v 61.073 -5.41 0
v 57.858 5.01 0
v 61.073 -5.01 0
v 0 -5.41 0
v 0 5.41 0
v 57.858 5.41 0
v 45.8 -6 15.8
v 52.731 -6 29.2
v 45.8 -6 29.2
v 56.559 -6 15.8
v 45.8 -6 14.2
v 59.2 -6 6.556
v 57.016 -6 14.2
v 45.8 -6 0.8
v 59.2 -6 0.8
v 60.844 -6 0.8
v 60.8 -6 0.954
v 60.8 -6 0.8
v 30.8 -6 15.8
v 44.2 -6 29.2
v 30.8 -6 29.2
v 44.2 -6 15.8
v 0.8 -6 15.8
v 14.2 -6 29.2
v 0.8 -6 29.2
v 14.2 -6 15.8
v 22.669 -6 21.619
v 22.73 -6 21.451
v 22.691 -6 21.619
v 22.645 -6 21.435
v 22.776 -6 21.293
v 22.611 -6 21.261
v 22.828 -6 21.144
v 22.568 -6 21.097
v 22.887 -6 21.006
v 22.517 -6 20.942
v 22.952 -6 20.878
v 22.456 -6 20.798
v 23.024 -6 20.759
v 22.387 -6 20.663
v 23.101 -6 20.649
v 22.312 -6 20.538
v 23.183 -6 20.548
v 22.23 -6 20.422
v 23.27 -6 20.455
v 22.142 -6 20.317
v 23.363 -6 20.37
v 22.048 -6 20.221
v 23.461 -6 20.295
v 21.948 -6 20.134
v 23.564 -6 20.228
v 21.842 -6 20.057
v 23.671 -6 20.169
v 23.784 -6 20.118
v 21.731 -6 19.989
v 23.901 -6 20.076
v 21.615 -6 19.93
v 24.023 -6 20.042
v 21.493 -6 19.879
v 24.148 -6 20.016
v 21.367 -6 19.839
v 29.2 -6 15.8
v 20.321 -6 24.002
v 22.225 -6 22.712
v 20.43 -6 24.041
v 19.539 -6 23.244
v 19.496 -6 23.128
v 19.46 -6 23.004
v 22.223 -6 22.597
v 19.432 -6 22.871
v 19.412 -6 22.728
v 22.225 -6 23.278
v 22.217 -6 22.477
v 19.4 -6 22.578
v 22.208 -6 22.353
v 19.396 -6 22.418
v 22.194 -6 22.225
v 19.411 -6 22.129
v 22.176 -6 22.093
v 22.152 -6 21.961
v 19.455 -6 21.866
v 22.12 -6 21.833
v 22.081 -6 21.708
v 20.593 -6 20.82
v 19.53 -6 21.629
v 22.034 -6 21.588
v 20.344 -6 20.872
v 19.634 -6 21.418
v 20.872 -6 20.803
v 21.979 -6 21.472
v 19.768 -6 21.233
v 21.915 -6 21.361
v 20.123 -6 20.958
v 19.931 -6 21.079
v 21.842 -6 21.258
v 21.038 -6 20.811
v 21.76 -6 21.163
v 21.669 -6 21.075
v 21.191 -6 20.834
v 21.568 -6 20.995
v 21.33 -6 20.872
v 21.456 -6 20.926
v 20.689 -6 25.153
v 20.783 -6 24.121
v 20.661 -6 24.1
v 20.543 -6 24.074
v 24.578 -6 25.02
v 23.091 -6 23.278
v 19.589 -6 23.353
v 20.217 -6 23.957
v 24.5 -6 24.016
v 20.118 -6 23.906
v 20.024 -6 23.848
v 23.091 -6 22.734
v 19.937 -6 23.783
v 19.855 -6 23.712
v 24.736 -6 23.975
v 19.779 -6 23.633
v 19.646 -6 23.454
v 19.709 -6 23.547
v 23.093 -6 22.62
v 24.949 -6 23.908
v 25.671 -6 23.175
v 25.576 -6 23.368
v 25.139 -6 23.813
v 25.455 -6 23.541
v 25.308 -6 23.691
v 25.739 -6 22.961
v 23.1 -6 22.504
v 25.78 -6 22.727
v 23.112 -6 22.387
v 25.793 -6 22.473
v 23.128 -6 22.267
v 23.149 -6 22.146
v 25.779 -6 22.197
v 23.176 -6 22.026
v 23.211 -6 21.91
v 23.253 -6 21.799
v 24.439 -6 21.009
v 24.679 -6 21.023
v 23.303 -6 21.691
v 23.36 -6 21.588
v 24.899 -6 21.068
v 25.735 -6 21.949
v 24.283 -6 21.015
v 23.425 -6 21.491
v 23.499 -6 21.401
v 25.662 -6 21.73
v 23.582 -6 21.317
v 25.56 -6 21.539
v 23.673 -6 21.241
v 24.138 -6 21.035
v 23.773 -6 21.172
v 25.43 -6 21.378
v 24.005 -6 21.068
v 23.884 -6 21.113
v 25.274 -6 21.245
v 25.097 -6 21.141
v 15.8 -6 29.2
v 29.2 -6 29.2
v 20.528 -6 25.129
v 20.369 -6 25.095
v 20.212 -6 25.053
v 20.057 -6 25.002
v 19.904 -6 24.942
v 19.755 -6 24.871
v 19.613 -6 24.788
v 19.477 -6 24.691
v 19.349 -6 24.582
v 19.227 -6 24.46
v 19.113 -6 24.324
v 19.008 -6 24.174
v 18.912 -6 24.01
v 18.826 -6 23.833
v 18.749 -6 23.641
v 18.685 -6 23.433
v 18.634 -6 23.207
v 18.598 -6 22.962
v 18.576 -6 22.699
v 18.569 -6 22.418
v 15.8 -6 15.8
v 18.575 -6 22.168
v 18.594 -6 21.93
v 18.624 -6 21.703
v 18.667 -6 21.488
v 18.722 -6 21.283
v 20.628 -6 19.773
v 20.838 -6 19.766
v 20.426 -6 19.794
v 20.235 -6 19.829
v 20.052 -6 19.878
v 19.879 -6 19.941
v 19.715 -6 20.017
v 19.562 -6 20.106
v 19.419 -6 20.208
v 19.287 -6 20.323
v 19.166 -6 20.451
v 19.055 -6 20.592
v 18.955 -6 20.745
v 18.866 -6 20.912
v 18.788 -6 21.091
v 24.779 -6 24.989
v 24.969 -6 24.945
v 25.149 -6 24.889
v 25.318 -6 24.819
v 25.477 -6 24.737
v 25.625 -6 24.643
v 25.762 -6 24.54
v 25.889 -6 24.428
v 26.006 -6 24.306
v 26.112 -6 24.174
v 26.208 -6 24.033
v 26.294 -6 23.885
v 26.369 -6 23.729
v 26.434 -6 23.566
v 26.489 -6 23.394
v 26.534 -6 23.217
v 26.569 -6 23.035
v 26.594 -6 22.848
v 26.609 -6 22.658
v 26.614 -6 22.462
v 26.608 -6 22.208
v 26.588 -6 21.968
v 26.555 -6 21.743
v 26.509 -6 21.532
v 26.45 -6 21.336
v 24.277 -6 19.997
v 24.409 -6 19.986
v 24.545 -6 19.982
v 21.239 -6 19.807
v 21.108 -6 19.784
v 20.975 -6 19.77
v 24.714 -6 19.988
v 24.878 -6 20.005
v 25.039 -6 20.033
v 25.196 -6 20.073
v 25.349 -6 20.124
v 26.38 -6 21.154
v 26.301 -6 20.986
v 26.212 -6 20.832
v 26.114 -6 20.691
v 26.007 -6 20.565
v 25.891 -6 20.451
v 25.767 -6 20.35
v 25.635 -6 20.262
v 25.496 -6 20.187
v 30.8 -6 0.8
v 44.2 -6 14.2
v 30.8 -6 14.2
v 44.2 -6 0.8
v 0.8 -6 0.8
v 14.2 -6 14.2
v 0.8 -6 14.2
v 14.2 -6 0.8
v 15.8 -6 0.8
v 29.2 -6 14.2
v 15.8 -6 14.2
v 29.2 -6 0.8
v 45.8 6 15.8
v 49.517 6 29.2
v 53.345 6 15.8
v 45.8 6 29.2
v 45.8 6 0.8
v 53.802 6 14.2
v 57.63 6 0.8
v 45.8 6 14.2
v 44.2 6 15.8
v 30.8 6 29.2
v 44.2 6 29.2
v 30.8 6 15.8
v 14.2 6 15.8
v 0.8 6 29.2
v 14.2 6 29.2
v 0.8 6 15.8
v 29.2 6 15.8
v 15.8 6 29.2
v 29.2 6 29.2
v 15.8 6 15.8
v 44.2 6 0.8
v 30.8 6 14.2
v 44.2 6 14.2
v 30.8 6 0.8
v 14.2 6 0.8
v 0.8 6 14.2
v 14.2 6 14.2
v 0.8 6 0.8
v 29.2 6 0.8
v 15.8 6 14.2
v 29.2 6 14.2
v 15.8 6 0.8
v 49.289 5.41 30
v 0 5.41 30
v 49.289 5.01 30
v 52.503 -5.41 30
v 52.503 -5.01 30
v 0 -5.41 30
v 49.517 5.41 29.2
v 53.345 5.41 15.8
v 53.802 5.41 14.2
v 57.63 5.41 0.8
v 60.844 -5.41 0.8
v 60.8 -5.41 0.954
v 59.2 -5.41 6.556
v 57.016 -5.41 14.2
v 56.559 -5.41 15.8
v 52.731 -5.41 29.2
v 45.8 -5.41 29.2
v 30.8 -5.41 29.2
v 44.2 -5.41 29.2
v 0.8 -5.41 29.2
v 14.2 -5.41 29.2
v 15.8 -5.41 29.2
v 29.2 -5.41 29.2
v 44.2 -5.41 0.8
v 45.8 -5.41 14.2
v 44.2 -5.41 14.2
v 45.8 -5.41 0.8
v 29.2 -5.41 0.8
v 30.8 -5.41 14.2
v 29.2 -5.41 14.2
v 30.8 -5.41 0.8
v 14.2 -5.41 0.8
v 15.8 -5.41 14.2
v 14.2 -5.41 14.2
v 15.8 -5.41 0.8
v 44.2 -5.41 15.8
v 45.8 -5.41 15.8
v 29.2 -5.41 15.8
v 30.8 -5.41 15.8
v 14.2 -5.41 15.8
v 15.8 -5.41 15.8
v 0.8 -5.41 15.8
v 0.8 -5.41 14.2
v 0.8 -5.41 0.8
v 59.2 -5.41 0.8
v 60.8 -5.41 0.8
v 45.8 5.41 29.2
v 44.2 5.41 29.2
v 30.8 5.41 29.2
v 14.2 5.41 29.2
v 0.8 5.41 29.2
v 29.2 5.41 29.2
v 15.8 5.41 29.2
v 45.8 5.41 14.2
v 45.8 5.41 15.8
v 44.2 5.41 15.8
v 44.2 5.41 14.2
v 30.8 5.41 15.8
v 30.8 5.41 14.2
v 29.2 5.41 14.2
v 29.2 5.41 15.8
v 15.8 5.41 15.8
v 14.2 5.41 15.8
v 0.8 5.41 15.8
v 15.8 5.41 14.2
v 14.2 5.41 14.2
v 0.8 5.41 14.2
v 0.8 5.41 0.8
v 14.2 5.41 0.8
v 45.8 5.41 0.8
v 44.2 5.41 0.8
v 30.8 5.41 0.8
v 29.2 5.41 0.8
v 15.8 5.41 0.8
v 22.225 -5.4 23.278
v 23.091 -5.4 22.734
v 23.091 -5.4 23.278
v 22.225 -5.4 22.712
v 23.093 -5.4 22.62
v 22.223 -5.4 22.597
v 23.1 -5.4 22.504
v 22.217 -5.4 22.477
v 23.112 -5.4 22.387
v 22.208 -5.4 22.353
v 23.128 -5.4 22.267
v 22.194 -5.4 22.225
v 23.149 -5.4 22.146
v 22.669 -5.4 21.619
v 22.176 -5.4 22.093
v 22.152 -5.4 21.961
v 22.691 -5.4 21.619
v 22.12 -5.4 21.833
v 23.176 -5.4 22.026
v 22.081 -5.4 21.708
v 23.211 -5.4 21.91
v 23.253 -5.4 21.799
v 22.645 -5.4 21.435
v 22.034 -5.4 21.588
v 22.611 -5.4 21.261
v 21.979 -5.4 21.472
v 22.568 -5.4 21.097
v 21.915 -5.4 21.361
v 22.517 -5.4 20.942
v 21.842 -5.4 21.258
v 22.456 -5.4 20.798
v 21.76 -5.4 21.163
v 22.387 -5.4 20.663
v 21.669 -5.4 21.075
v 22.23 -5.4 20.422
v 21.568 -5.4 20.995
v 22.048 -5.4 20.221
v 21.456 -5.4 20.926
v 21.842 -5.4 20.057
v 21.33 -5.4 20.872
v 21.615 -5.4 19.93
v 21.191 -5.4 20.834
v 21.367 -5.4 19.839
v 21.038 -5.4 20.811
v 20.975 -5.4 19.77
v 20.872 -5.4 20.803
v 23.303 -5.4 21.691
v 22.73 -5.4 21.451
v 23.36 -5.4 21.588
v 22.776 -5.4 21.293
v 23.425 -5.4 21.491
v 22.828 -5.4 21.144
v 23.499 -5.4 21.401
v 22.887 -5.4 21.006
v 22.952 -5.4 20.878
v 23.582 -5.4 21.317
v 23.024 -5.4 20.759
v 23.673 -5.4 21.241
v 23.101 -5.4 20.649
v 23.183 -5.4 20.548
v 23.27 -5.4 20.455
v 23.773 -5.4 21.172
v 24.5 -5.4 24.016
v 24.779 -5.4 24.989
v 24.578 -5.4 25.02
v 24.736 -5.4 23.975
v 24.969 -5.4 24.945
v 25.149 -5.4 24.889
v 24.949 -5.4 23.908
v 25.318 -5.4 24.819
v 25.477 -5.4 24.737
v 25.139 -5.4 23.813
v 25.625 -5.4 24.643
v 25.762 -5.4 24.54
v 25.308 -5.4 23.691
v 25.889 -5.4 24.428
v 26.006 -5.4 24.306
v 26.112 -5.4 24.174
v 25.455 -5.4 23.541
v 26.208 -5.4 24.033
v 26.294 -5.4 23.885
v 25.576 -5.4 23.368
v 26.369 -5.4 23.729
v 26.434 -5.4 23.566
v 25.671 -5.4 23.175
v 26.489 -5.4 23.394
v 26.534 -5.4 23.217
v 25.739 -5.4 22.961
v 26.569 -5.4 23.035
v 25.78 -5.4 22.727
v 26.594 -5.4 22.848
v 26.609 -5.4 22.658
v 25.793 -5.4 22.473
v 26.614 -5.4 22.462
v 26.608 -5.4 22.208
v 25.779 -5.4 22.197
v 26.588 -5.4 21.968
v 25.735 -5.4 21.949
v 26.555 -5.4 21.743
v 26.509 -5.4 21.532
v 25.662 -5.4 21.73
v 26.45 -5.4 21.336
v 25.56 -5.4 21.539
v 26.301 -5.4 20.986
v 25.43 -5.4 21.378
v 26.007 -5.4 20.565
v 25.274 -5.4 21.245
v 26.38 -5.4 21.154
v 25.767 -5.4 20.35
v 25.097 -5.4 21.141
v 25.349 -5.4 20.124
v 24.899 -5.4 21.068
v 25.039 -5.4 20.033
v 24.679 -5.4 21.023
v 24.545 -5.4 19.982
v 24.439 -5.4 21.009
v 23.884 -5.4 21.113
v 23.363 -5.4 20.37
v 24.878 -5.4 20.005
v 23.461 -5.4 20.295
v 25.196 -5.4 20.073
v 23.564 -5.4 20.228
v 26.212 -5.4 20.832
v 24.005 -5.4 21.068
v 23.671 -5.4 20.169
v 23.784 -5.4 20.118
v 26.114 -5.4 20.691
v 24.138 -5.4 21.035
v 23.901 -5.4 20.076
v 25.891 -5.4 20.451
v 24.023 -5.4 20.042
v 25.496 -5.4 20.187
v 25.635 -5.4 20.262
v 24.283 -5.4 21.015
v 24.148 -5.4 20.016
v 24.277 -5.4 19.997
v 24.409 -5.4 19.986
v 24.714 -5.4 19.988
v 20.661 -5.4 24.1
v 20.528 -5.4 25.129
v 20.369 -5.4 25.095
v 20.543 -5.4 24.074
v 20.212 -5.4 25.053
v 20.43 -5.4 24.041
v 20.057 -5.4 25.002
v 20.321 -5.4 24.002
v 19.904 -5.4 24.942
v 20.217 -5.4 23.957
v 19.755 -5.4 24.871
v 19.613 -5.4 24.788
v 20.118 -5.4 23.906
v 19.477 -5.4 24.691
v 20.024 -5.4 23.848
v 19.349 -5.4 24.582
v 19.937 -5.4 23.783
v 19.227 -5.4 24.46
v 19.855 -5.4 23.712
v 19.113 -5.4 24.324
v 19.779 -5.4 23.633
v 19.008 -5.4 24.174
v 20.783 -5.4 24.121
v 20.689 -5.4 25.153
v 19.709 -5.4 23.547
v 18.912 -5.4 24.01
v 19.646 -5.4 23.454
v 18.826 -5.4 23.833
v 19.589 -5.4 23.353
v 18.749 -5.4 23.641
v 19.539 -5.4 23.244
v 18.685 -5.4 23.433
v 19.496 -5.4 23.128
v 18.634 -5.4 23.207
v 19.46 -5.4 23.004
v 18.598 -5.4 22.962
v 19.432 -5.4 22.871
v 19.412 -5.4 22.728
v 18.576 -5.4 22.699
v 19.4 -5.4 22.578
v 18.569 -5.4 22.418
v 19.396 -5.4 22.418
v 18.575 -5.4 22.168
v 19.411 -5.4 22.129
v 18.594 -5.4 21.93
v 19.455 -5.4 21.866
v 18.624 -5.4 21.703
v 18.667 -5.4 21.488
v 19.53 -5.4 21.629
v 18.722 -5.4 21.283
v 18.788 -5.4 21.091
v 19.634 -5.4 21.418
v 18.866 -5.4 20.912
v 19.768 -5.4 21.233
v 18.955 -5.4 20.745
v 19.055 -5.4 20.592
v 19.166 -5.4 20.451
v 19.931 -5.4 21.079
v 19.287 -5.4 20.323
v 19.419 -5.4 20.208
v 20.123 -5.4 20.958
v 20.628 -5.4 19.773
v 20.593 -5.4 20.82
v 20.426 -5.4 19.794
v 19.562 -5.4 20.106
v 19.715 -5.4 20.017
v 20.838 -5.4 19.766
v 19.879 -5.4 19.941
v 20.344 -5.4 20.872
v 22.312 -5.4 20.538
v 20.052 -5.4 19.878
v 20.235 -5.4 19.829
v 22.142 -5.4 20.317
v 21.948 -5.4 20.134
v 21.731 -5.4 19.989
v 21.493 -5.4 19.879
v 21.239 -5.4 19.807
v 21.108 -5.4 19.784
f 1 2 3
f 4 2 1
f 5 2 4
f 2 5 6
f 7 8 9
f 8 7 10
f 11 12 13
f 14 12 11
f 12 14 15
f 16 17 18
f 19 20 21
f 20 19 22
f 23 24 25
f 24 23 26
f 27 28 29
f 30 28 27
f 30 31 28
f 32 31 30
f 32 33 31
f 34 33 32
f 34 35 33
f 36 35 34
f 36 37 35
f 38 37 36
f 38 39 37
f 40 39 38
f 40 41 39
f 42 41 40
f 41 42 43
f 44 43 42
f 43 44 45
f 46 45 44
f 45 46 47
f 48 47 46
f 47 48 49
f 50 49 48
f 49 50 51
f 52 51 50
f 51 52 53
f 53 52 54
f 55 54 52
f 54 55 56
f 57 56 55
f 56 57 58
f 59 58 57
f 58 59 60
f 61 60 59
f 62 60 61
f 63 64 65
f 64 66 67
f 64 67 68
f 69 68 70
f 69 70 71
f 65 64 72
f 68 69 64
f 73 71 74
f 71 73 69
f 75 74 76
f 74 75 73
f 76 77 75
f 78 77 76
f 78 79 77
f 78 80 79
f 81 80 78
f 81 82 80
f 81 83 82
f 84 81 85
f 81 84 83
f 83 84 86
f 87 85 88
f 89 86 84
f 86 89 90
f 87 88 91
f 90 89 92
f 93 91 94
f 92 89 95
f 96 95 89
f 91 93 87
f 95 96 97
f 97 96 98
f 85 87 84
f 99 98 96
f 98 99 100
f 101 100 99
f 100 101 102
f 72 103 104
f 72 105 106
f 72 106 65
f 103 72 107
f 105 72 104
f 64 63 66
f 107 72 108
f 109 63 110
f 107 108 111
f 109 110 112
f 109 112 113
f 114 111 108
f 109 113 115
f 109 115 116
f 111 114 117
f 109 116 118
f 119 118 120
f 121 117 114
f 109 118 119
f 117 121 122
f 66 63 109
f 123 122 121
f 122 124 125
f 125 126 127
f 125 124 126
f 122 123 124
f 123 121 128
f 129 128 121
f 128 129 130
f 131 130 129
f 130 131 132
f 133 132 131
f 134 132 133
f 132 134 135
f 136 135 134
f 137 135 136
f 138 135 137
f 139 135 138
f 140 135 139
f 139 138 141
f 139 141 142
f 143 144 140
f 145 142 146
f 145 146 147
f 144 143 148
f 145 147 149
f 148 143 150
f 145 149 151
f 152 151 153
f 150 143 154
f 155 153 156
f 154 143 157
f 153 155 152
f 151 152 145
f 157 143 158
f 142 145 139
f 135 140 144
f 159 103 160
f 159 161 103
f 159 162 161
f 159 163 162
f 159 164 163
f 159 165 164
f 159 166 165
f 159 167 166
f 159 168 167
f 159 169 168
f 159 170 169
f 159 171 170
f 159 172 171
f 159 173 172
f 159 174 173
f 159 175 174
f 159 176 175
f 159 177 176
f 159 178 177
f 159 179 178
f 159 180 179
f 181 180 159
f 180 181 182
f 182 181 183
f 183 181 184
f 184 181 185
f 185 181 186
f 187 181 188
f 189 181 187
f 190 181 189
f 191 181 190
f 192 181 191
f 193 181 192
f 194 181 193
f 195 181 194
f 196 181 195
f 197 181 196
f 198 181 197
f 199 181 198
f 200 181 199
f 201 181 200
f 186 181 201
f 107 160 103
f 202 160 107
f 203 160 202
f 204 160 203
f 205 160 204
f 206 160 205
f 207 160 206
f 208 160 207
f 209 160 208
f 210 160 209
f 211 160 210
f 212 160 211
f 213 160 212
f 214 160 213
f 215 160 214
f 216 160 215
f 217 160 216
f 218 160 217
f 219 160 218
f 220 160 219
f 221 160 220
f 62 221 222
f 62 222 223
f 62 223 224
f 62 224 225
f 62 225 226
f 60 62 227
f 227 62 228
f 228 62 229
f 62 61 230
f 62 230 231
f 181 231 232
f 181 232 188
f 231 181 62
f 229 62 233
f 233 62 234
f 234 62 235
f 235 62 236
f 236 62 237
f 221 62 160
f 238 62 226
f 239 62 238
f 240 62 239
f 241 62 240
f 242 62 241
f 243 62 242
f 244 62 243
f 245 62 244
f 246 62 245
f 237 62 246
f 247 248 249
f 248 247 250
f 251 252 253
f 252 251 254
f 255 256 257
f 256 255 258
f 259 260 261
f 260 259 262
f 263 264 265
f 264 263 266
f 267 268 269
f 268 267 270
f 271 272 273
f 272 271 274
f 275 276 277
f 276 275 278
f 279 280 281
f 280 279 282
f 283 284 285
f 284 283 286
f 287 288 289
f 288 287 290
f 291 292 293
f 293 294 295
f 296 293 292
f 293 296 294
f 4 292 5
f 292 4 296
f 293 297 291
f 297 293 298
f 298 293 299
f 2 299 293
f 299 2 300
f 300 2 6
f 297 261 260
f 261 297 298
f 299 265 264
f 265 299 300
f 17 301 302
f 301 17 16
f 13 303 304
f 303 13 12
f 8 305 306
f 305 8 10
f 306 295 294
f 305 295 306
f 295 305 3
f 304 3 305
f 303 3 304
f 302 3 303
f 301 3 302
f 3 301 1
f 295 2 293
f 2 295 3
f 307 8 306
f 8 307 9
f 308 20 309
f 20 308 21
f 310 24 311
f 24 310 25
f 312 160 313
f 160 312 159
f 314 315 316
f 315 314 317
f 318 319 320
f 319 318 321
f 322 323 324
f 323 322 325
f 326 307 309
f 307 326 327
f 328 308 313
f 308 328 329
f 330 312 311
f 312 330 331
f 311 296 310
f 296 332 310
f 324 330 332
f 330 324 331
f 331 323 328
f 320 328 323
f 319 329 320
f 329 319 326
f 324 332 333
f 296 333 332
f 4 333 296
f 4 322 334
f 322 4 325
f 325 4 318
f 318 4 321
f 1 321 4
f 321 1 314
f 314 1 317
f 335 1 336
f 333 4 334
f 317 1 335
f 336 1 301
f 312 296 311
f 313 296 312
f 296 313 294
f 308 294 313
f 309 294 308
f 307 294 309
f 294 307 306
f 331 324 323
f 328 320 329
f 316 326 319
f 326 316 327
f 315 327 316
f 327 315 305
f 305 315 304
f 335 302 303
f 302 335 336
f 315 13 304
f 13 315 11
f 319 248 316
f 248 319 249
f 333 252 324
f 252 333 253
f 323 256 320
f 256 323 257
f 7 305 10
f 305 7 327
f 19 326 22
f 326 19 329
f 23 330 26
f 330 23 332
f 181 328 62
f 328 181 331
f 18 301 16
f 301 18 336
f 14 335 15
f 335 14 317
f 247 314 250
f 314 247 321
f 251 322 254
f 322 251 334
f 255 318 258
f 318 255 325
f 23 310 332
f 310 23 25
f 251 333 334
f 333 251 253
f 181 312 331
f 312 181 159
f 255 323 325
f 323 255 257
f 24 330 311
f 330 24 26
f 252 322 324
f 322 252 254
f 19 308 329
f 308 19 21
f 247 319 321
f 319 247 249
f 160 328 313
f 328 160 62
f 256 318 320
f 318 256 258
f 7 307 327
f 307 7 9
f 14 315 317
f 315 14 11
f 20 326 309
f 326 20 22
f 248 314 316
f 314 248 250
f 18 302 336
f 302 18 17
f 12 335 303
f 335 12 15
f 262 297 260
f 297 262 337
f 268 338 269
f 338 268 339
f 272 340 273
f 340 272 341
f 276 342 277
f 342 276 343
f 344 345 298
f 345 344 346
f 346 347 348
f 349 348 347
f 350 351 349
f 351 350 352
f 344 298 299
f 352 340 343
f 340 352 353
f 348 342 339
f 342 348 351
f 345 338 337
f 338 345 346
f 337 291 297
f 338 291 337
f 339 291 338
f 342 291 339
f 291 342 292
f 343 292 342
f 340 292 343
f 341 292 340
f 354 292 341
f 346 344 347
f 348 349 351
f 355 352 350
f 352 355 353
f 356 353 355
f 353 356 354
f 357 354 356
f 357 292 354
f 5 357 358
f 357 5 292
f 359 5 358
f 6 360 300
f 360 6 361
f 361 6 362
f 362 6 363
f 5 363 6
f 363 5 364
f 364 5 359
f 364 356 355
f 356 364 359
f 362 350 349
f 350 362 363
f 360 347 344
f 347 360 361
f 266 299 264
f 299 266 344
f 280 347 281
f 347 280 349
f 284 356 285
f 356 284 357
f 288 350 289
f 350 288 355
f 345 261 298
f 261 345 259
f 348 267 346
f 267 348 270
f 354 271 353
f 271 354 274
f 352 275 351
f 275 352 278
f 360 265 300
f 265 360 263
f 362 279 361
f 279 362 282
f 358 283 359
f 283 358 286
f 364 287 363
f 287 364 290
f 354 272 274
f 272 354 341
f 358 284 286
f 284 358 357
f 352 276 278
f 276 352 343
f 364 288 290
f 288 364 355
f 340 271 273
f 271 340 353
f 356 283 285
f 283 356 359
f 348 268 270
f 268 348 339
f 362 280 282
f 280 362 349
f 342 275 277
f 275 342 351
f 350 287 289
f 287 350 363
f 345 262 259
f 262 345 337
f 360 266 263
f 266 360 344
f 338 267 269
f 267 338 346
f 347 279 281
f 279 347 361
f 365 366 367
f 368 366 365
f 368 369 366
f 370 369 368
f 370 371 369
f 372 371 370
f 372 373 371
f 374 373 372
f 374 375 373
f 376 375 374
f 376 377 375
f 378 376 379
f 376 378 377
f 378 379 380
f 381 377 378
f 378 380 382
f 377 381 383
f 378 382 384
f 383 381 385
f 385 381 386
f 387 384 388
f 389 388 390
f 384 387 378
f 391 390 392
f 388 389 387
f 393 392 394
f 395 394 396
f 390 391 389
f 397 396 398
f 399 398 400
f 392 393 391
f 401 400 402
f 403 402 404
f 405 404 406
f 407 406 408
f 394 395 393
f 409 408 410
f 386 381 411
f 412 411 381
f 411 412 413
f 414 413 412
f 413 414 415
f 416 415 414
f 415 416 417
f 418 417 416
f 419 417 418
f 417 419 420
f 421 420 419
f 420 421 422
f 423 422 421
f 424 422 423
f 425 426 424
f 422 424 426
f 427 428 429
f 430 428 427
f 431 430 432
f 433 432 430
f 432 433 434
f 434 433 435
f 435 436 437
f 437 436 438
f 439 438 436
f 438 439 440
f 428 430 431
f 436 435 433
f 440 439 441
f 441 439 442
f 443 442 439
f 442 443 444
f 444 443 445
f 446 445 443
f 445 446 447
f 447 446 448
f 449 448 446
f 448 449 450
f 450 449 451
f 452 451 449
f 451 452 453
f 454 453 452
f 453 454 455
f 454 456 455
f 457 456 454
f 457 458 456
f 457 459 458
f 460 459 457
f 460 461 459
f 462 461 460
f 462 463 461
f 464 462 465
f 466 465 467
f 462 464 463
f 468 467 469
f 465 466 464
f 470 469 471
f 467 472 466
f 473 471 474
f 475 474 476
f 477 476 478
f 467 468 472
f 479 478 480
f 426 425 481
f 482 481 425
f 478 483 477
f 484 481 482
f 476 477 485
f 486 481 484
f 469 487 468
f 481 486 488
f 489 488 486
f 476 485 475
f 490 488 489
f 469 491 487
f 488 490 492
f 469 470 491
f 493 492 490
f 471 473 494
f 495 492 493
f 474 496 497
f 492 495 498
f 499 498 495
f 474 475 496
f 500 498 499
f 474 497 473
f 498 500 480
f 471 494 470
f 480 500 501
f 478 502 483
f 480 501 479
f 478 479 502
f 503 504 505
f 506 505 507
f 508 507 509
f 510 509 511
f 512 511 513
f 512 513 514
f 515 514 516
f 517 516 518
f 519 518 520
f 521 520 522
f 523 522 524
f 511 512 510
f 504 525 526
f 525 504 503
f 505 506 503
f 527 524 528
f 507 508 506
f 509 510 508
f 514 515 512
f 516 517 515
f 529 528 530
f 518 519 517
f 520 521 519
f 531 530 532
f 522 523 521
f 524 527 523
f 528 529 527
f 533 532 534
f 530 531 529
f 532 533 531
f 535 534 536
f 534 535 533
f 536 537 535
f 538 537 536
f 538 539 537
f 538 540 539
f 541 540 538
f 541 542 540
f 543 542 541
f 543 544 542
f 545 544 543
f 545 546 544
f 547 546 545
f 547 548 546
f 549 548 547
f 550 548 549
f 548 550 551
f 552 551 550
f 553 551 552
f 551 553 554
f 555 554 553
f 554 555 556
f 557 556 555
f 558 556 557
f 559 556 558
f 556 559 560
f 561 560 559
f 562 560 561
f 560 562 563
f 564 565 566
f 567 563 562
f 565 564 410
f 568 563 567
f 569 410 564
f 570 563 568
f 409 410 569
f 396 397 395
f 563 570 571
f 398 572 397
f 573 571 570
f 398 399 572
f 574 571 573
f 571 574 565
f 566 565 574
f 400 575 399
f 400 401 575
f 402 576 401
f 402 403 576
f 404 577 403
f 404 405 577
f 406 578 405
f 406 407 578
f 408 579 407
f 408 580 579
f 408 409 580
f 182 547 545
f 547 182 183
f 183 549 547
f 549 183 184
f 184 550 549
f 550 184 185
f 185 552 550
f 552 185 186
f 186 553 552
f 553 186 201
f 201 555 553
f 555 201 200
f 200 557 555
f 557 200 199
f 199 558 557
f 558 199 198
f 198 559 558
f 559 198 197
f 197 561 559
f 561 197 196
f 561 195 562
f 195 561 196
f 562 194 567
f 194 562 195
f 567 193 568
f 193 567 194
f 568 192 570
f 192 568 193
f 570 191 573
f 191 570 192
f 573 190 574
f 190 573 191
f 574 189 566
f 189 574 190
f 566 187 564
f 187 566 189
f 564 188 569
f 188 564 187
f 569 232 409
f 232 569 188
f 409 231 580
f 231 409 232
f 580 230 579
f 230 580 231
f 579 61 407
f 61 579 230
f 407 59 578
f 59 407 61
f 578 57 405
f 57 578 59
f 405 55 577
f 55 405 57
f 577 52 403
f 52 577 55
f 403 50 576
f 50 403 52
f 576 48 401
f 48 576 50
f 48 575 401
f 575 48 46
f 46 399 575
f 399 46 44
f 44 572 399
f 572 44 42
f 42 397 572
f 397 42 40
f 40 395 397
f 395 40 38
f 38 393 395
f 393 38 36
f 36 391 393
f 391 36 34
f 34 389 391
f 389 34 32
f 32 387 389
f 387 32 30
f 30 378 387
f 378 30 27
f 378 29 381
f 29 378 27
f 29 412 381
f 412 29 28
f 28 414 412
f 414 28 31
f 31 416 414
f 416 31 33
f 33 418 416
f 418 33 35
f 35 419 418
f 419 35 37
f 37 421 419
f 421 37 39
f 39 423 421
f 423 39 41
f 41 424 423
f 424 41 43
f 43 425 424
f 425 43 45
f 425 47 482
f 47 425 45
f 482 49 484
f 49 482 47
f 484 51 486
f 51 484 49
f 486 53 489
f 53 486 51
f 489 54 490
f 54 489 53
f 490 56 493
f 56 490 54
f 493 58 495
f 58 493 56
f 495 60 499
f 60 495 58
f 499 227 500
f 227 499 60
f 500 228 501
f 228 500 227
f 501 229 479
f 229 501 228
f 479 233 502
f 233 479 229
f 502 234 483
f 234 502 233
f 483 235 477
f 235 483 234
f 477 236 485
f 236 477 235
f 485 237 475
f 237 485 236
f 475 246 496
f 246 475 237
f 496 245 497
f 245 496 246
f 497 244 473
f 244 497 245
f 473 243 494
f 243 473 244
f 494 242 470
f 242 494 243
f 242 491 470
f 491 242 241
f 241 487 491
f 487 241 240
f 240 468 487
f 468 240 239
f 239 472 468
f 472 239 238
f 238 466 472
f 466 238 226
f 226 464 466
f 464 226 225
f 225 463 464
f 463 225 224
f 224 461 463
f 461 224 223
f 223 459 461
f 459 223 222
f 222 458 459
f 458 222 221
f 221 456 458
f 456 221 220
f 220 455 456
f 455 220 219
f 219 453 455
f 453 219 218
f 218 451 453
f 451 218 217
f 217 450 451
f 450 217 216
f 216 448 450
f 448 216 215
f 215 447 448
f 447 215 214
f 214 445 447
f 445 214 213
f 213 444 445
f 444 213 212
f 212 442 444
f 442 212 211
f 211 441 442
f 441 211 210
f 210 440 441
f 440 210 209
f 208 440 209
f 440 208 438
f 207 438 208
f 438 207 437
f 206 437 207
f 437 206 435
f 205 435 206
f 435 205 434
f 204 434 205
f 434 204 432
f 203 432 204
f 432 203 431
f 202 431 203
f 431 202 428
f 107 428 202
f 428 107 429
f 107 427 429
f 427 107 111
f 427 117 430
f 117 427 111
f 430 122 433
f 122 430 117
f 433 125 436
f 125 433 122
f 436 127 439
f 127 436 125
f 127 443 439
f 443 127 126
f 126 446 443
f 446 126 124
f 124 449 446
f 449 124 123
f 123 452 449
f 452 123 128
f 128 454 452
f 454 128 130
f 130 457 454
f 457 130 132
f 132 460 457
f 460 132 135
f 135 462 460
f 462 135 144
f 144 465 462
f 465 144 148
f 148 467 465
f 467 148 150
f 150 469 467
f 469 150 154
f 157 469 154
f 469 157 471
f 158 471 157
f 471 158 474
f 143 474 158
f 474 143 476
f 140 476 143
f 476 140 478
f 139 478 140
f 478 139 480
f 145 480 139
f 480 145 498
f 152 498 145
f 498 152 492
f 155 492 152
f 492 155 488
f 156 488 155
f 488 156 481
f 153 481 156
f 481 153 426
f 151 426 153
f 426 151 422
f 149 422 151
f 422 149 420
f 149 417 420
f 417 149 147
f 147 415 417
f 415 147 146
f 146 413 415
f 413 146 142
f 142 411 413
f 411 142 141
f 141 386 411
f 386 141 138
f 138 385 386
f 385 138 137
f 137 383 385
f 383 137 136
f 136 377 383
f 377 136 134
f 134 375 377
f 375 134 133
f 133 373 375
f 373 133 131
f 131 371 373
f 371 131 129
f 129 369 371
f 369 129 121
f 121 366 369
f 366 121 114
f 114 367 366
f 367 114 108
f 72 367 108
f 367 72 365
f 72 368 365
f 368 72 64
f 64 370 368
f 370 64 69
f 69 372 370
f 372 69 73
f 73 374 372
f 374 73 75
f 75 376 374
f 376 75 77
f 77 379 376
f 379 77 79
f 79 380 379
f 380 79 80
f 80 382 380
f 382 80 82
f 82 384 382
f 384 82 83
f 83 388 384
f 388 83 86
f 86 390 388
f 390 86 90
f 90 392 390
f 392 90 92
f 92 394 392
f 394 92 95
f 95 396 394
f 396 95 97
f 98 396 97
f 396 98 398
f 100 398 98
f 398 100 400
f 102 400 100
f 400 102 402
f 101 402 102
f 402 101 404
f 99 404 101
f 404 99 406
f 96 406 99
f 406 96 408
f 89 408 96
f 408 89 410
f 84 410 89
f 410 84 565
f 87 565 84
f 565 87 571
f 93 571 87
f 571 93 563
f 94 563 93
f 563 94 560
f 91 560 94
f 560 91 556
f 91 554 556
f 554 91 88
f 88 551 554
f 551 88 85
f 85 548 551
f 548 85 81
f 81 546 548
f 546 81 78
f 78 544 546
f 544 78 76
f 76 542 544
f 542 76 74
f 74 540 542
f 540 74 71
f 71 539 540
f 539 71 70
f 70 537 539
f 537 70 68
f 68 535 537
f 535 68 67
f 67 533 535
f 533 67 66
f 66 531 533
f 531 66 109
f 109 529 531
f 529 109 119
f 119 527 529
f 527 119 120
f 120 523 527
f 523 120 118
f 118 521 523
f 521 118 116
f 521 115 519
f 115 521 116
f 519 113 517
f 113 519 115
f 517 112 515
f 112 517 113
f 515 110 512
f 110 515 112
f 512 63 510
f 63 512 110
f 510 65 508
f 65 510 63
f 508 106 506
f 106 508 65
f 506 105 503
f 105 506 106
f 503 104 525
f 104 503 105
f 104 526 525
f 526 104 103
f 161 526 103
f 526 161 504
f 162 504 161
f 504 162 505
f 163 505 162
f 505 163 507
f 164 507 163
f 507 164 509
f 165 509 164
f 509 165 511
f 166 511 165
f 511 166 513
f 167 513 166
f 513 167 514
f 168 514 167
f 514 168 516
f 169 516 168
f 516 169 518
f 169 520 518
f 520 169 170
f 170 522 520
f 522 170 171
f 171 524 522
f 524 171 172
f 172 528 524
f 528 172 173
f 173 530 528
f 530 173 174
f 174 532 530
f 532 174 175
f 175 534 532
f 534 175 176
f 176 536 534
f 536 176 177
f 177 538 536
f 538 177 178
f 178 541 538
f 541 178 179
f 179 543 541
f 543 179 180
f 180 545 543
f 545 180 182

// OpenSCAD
/*

  puzzle_part_3.scad

  Winston Freer Tile Puzzle: Part 3
      
  (c) olikraus@gmail.com

  This work is licensed under the Creative Commons Attribution-NonCommercial-ShareAlike 4.0 International License. 
  To view a copy of this license, visit http://creativecommons.org/licenses/by-nc-sa/4.0/.
    
*/

include <winston_freer.scad>;



translate([0,0,2*ts])
rotate([0,90,-90]) 
part3();
